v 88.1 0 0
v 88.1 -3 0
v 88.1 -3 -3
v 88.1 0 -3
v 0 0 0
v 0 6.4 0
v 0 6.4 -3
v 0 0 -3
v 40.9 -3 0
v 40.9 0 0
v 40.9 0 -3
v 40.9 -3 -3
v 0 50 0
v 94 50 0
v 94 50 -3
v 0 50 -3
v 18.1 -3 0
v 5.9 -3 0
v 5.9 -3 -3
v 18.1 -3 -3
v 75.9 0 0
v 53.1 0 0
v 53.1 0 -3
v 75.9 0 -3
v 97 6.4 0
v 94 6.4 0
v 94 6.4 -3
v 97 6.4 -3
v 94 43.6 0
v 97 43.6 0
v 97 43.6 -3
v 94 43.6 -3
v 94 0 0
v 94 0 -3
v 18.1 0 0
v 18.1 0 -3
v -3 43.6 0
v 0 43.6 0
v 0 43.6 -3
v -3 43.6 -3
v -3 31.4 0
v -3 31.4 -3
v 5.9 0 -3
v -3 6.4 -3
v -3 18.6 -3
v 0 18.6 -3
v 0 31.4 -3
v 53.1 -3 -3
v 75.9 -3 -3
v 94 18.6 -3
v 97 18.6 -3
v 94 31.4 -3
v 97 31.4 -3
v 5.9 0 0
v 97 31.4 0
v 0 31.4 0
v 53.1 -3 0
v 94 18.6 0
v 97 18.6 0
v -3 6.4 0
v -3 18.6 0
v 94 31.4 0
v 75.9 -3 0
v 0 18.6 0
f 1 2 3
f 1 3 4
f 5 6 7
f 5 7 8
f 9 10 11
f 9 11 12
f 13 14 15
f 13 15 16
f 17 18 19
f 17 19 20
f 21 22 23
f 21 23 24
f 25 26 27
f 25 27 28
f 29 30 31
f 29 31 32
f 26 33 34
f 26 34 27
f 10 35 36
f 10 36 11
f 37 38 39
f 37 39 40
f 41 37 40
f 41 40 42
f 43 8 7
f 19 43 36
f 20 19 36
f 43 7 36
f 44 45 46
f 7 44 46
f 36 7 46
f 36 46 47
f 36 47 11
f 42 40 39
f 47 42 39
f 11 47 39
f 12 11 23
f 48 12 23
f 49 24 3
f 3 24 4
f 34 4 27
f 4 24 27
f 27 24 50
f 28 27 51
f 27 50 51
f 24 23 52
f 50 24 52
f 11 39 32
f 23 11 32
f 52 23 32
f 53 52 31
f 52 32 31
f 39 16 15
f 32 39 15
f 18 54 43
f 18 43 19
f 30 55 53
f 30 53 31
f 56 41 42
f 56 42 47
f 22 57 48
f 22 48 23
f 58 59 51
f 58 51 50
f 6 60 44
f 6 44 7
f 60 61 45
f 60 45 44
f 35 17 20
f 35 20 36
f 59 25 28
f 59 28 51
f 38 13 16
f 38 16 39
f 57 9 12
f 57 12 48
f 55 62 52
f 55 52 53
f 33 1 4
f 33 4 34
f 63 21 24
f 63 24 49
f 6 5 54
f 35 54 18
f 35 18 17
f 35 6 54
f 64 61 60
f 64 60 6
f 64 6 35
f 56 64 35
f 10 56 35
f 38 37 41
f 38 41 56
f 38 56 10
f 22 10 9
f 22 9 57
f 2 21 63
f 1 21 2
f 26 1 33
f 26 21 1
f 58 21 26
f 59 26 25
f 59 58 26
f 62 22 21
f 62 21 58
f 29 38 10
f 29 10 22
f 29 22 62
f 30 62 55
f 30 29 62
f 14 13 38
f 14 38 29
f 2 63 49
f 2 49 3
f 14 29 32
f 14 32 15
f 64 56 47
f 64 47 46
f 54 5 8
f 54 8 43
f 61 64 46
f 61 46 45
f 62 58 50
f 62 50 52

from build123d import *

# Parameters (mm, degrees)
EXTRUDE_1_DEPTH = 3


with BuildPart() as part:
    # Эскиз1 → Бобышка-Вытянуть1 (new body)
    with BuildSketch(Plane.XY):
        Polygon((0, 0), (5.9, 0), (5.9, -3), (18.1, -3), (18.1, 0), (40.9, 0), (40.9, -3), (53.1, -3), (53.1, 0), (75.9, 0), (75.9, -3), (88.1, -3), (88.1, 0), (94, 0), (94, 6.4), (97, 6.4), (97, 18.6), (94, 18.6), (94, 31.4), (97, 31.4), (97, 43.6), (94, 43.6), (94, 50), (0, 50), (0, 43.6), (-3, 43.6), (-3, 31.4), (0, 31.4), (0, 18.6), (-3, 18.6), (-3, 6.4), (0, 6.4), align=None)
    extrude(amount=-EXTRUDE_1_DEPTH)


solid = part.part
